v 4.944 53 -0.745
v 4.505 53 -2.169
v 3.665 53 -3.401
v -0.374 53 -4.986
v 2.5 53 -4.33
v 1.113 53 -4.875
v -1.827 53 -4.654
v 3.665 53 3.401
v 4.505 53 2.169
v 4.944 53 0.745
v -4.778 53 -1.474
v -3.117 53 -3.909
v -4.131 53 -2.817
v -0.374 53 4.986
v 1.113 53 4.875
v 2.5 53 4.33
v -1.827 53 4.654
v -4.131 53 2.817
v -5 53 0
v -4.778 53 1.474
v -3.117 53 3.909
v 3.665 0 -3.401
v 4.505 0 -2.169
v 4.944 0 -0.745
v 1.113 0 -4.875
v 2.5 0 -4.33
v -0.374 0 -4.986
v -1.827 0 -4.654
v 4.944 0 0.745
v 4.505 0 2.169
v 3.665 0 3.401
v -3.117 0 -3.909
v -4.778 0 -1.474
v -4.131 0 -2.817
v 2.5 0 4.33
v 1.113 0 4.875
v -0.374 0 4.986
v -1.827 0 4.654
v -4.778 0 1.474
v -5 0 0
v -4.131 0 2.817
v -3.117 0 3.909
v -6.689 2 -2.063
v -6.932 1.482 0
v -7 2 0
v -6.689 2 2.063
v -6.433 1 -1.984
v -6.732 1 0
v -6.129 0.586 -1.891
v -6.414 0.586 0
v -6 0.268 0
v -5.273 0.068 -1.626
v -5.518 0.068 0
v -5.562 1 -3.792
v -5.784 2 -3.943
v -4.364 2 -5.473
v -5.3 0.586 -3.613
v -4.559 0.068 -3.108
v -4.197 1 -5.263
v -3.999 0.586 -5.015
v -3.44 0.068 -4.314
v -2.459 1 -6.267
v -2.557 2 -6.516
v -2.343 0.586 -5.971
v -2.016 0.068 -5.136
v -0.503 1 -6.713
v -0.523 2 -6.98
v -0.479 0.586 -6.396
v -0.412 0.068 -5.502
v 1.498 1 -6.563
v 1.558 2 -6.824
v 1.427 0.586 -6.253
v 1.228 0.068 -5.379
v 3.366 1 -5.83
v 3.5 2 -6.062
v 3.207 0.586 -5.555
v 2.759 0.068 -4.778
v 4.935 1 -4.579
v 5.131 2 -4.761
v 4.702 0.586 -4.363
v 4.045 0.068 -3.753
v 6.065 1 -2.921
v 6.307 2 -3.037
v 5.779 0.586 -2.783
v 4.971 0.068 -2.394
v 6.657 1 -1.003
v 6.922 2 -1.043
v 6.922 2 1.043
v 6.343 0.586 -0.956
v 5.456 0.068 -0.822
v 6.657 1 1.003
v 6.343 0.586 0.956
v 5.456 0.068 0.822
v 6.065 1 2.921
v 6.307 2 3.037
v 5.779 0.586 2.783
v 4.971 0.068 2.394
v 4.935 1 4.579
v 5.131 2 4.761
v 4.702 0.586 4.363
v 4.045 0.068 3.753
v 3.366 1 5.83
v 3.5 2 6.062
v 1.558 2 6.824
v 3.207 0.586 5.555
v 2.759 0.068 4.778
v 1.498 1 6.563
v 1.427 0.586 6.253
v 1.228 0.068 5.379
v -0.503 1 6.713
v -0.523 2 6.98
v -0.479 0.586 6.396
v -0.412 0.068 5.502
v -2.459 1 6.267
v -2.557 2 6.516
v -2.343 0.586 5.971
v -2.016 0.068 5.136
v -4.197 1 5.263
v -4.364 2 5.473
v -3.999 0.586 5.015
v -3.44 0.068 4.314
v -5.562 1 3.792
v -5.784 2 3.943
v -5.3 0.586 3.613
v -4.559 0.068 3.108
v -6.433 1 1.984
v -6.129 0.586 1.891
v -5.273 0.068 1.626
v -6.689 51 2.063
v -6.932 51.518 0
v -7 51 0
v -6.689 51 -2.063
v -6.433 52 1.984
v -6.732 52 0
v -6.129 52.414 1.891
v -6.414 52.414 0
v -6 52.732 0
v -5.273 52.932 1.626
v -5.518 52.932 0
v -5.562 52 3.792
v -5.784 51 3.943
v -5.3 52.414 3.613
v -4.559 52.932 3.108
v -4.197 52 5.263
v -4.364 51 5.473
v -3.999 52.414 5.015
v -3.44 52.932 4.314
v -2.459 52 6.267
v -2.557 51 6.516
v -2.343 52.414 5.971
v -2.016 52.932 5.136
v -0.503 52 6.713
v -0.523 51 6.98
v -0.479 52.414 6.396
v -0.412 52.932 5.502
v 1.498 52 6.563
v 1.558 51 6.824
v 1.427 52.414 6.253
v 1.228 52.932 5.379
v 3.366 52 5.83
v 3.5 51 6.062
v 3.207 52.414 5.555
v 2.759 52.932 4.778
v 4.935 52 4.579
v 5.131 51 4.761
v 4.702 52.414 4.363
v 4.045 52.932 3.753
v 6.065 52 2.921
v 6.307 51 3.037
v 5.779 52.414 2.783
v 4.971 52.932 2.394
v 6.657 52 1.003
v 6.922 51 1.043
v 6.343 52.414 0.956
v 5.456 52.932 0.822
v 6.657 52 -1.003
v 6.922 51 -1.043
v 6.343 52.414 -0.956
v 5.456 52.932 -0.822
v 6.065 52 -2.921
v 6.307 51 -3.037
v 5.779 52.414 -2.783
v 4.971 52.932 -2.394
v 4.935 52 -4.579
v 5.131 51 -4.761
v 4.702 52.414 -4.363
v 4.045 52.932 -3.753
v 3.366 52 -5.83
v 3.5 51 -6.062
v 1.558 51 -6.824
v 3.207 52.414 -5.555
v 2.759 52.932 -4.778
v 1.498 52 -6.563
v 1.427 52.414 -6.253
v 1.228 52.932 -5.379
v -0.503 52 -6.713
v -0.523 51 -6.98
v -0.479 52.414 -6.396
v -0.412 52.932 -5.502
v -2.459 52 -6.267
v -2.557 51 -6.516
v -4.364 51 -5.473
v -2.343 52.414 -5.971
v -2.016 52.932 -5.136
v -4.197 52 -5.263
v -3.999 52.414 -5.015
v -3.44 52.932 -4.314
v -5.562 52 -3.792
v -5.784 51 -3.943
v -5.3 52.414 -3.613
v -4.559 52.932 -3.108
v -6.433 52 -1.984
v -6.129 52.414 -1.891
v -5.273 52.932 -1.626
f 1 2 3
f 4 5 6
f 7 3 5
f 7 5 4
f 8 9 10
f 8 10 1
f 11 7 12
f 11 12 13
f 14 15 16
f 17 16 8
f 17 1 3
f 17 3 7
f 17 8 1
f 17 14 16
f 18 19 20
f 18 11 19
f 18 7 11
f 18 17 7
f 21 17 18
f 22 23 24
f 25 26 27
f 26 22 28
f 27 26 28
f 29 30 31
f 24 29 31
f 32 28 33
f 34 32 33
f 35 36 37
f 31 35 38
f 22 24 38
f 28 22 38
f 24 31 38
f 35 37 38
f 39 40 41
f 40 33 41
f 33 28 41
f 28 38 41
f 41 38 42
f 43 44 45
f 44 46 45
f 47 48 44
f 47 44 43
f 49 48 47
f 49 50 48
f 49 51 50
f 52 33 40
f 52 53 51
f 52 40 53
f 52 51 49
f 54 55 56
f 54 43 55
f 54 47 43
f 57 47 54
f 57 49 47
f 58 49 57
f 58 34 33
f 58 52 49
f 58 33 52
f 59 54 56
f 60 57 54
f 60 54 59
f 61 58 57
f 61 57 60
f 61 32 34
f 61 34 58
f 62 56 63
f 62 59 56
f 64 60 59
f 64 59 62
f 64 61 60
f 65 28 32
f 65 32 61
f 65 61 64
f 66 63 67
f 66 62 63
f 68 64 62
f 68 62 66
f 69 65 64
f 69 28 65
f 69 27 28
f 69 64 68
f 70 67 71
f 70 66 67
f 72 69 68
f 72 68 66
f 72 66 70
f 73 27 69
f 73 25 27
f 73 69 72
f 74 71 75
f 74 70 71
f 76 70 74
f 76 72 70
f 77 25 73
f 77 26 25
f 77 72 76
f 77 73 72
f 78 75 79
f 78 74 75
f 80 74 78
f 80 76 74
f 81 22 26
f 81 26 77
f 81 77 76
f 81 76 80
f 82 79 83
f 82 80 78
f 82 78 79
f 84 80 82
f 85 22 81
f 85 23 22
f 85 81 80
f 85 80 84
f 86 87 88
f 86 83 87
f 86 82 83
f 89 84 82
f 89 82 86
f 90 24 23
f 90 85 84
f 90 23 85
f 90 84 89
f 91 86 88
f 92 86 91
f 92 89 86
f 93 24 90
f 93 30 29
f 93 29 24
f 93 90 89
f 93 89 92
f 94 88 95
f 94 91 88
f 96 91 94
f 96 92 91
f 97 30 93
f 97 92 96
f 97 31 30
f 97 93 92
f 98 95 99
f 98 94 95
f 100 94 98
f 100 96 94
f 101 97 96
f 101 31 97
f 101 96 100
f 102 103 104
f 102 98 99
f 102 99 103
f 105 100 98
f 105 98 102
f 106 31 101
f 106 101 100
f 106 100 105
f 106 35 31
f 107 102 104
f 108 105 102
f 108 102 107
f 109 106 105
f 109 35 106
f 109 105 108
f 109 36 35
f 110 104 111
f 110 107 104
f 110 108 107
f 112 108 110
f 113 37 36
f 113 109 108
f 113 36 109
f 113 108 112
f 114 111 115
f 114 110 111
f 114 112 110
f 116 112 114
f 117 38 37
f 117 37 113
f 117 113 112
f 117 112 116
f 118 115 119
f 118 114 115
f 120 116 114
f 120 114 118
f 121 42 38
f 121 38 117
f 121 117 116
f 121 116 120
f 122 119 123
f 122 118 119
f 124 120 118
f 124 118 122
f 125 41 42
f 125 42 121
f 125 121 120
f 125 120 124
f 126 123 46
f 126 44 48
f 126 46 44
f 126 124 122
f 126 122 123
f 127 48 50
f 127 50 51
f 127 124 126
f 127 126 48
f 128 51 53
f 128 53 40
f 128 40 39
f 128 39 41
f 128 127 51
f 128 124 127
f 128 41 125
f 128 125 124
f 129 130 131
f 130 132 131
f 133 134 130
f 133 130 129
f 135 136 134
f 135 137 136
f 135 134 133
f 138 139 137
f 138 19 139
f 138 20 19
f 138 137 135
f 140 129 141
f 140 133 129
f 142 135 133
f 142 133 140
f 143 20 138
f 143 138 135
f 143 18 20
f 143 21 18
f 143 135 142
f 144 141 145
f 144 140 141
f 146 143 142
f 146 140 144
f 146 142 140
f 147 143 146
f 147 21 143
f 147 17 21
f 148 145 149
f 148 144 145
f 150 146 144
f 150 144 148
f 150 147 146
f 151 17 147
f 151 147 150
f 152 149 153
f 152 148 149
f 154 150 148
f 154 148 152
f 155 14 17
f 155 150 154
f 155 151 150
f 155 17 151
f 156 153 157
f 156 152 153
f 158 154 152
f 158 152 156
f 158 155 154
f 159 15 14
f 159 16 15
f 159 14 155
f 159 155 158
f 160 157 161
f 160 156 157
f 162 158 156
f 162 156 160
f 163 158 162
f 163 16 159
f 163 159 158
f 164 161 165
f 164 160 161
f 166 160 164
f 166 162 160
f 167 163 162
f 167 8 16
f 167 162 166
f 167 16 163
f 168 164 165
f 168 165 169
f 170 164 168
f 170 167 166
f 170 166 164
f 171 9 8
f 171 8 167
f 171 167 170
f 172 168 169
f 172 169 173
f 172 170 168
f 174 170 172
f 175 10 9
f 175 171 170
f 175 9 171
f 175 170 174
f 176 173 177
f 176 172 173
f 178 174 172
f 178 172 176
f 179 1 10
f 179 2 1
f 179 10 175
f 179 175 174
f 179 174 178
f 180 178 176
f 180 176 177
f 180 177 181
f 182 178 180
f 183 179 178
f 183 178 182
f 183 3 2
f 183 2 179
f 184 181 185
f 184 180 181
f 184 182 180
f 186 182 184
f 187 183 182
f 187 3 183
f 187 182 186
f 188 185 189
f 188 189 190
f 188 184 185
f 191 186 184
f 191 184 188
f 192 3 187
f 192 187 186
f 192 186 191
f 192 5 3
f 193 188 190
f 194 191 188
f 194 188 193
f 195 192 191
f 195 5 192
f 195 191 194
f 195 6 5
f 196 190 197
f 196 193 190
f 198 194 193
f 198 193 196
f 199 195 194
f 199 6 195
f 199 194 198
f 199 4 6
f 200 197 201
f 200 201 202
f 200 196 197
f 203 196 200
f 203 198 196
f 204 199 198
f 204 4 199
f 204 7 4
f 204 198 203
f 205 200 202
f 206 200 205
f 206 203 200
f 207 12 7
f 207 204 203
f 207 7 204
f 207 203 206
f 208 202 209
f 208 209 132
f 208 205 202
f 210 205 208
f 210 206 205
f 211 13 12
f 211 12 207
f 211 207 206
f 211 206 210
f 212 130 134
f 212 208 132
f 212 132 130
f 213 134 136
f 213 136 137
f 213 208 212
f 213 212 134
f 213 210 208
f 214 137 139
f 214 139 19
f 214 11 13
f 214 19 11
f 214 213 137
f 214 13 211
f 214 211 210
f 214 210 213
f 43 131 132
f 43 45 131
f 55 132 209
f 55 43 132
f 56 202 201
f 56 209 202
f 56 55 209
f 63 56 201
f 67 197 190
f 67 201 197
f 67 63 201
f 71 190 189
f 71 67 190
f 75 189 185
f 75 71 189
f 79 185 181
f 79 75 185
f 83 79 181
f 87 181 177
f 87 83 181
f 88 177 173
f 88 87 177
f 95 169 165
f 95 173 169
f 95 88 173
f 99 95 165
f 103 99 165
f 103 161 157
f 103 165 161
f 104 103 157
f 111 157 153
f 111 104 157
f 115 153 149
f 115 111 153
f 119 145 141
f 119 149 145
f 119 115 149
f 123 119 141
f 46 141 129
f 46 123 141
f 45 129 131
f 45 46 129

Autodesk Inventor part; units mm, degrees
ref_plane "YZ Plane" through (0, 0, 0) normal (1, 0, 0) x (0, 1, 0)
ref_plane "XZ Plane" through (0, 0, 0) normal (0, 1, 0) x (-1, 0, 0)
ref_plane "XY Plane" through (0, 0, 0) normal (0, 0, 1) x (1, 0, 0)
sketch "Sketch1" plane through (0, 0, 0) normal (0, 1, 0) x (-1, 0, 0)
  circle A0 centre (0, 0) radius 7
  dimension "d0" = 14
extrude "Extrusion1" add sketch "Sketch1" along normal blind 53
fillet "Fillet1" radius 2 2 edges at (7, 0, 0) (7, 53, 0)
ref_plane "Work Plane1" through (0, 15, 0) normal (0, -1, 0) x (1, 0, 0)
split_face "Split1"
properties part number "739136_AA"
